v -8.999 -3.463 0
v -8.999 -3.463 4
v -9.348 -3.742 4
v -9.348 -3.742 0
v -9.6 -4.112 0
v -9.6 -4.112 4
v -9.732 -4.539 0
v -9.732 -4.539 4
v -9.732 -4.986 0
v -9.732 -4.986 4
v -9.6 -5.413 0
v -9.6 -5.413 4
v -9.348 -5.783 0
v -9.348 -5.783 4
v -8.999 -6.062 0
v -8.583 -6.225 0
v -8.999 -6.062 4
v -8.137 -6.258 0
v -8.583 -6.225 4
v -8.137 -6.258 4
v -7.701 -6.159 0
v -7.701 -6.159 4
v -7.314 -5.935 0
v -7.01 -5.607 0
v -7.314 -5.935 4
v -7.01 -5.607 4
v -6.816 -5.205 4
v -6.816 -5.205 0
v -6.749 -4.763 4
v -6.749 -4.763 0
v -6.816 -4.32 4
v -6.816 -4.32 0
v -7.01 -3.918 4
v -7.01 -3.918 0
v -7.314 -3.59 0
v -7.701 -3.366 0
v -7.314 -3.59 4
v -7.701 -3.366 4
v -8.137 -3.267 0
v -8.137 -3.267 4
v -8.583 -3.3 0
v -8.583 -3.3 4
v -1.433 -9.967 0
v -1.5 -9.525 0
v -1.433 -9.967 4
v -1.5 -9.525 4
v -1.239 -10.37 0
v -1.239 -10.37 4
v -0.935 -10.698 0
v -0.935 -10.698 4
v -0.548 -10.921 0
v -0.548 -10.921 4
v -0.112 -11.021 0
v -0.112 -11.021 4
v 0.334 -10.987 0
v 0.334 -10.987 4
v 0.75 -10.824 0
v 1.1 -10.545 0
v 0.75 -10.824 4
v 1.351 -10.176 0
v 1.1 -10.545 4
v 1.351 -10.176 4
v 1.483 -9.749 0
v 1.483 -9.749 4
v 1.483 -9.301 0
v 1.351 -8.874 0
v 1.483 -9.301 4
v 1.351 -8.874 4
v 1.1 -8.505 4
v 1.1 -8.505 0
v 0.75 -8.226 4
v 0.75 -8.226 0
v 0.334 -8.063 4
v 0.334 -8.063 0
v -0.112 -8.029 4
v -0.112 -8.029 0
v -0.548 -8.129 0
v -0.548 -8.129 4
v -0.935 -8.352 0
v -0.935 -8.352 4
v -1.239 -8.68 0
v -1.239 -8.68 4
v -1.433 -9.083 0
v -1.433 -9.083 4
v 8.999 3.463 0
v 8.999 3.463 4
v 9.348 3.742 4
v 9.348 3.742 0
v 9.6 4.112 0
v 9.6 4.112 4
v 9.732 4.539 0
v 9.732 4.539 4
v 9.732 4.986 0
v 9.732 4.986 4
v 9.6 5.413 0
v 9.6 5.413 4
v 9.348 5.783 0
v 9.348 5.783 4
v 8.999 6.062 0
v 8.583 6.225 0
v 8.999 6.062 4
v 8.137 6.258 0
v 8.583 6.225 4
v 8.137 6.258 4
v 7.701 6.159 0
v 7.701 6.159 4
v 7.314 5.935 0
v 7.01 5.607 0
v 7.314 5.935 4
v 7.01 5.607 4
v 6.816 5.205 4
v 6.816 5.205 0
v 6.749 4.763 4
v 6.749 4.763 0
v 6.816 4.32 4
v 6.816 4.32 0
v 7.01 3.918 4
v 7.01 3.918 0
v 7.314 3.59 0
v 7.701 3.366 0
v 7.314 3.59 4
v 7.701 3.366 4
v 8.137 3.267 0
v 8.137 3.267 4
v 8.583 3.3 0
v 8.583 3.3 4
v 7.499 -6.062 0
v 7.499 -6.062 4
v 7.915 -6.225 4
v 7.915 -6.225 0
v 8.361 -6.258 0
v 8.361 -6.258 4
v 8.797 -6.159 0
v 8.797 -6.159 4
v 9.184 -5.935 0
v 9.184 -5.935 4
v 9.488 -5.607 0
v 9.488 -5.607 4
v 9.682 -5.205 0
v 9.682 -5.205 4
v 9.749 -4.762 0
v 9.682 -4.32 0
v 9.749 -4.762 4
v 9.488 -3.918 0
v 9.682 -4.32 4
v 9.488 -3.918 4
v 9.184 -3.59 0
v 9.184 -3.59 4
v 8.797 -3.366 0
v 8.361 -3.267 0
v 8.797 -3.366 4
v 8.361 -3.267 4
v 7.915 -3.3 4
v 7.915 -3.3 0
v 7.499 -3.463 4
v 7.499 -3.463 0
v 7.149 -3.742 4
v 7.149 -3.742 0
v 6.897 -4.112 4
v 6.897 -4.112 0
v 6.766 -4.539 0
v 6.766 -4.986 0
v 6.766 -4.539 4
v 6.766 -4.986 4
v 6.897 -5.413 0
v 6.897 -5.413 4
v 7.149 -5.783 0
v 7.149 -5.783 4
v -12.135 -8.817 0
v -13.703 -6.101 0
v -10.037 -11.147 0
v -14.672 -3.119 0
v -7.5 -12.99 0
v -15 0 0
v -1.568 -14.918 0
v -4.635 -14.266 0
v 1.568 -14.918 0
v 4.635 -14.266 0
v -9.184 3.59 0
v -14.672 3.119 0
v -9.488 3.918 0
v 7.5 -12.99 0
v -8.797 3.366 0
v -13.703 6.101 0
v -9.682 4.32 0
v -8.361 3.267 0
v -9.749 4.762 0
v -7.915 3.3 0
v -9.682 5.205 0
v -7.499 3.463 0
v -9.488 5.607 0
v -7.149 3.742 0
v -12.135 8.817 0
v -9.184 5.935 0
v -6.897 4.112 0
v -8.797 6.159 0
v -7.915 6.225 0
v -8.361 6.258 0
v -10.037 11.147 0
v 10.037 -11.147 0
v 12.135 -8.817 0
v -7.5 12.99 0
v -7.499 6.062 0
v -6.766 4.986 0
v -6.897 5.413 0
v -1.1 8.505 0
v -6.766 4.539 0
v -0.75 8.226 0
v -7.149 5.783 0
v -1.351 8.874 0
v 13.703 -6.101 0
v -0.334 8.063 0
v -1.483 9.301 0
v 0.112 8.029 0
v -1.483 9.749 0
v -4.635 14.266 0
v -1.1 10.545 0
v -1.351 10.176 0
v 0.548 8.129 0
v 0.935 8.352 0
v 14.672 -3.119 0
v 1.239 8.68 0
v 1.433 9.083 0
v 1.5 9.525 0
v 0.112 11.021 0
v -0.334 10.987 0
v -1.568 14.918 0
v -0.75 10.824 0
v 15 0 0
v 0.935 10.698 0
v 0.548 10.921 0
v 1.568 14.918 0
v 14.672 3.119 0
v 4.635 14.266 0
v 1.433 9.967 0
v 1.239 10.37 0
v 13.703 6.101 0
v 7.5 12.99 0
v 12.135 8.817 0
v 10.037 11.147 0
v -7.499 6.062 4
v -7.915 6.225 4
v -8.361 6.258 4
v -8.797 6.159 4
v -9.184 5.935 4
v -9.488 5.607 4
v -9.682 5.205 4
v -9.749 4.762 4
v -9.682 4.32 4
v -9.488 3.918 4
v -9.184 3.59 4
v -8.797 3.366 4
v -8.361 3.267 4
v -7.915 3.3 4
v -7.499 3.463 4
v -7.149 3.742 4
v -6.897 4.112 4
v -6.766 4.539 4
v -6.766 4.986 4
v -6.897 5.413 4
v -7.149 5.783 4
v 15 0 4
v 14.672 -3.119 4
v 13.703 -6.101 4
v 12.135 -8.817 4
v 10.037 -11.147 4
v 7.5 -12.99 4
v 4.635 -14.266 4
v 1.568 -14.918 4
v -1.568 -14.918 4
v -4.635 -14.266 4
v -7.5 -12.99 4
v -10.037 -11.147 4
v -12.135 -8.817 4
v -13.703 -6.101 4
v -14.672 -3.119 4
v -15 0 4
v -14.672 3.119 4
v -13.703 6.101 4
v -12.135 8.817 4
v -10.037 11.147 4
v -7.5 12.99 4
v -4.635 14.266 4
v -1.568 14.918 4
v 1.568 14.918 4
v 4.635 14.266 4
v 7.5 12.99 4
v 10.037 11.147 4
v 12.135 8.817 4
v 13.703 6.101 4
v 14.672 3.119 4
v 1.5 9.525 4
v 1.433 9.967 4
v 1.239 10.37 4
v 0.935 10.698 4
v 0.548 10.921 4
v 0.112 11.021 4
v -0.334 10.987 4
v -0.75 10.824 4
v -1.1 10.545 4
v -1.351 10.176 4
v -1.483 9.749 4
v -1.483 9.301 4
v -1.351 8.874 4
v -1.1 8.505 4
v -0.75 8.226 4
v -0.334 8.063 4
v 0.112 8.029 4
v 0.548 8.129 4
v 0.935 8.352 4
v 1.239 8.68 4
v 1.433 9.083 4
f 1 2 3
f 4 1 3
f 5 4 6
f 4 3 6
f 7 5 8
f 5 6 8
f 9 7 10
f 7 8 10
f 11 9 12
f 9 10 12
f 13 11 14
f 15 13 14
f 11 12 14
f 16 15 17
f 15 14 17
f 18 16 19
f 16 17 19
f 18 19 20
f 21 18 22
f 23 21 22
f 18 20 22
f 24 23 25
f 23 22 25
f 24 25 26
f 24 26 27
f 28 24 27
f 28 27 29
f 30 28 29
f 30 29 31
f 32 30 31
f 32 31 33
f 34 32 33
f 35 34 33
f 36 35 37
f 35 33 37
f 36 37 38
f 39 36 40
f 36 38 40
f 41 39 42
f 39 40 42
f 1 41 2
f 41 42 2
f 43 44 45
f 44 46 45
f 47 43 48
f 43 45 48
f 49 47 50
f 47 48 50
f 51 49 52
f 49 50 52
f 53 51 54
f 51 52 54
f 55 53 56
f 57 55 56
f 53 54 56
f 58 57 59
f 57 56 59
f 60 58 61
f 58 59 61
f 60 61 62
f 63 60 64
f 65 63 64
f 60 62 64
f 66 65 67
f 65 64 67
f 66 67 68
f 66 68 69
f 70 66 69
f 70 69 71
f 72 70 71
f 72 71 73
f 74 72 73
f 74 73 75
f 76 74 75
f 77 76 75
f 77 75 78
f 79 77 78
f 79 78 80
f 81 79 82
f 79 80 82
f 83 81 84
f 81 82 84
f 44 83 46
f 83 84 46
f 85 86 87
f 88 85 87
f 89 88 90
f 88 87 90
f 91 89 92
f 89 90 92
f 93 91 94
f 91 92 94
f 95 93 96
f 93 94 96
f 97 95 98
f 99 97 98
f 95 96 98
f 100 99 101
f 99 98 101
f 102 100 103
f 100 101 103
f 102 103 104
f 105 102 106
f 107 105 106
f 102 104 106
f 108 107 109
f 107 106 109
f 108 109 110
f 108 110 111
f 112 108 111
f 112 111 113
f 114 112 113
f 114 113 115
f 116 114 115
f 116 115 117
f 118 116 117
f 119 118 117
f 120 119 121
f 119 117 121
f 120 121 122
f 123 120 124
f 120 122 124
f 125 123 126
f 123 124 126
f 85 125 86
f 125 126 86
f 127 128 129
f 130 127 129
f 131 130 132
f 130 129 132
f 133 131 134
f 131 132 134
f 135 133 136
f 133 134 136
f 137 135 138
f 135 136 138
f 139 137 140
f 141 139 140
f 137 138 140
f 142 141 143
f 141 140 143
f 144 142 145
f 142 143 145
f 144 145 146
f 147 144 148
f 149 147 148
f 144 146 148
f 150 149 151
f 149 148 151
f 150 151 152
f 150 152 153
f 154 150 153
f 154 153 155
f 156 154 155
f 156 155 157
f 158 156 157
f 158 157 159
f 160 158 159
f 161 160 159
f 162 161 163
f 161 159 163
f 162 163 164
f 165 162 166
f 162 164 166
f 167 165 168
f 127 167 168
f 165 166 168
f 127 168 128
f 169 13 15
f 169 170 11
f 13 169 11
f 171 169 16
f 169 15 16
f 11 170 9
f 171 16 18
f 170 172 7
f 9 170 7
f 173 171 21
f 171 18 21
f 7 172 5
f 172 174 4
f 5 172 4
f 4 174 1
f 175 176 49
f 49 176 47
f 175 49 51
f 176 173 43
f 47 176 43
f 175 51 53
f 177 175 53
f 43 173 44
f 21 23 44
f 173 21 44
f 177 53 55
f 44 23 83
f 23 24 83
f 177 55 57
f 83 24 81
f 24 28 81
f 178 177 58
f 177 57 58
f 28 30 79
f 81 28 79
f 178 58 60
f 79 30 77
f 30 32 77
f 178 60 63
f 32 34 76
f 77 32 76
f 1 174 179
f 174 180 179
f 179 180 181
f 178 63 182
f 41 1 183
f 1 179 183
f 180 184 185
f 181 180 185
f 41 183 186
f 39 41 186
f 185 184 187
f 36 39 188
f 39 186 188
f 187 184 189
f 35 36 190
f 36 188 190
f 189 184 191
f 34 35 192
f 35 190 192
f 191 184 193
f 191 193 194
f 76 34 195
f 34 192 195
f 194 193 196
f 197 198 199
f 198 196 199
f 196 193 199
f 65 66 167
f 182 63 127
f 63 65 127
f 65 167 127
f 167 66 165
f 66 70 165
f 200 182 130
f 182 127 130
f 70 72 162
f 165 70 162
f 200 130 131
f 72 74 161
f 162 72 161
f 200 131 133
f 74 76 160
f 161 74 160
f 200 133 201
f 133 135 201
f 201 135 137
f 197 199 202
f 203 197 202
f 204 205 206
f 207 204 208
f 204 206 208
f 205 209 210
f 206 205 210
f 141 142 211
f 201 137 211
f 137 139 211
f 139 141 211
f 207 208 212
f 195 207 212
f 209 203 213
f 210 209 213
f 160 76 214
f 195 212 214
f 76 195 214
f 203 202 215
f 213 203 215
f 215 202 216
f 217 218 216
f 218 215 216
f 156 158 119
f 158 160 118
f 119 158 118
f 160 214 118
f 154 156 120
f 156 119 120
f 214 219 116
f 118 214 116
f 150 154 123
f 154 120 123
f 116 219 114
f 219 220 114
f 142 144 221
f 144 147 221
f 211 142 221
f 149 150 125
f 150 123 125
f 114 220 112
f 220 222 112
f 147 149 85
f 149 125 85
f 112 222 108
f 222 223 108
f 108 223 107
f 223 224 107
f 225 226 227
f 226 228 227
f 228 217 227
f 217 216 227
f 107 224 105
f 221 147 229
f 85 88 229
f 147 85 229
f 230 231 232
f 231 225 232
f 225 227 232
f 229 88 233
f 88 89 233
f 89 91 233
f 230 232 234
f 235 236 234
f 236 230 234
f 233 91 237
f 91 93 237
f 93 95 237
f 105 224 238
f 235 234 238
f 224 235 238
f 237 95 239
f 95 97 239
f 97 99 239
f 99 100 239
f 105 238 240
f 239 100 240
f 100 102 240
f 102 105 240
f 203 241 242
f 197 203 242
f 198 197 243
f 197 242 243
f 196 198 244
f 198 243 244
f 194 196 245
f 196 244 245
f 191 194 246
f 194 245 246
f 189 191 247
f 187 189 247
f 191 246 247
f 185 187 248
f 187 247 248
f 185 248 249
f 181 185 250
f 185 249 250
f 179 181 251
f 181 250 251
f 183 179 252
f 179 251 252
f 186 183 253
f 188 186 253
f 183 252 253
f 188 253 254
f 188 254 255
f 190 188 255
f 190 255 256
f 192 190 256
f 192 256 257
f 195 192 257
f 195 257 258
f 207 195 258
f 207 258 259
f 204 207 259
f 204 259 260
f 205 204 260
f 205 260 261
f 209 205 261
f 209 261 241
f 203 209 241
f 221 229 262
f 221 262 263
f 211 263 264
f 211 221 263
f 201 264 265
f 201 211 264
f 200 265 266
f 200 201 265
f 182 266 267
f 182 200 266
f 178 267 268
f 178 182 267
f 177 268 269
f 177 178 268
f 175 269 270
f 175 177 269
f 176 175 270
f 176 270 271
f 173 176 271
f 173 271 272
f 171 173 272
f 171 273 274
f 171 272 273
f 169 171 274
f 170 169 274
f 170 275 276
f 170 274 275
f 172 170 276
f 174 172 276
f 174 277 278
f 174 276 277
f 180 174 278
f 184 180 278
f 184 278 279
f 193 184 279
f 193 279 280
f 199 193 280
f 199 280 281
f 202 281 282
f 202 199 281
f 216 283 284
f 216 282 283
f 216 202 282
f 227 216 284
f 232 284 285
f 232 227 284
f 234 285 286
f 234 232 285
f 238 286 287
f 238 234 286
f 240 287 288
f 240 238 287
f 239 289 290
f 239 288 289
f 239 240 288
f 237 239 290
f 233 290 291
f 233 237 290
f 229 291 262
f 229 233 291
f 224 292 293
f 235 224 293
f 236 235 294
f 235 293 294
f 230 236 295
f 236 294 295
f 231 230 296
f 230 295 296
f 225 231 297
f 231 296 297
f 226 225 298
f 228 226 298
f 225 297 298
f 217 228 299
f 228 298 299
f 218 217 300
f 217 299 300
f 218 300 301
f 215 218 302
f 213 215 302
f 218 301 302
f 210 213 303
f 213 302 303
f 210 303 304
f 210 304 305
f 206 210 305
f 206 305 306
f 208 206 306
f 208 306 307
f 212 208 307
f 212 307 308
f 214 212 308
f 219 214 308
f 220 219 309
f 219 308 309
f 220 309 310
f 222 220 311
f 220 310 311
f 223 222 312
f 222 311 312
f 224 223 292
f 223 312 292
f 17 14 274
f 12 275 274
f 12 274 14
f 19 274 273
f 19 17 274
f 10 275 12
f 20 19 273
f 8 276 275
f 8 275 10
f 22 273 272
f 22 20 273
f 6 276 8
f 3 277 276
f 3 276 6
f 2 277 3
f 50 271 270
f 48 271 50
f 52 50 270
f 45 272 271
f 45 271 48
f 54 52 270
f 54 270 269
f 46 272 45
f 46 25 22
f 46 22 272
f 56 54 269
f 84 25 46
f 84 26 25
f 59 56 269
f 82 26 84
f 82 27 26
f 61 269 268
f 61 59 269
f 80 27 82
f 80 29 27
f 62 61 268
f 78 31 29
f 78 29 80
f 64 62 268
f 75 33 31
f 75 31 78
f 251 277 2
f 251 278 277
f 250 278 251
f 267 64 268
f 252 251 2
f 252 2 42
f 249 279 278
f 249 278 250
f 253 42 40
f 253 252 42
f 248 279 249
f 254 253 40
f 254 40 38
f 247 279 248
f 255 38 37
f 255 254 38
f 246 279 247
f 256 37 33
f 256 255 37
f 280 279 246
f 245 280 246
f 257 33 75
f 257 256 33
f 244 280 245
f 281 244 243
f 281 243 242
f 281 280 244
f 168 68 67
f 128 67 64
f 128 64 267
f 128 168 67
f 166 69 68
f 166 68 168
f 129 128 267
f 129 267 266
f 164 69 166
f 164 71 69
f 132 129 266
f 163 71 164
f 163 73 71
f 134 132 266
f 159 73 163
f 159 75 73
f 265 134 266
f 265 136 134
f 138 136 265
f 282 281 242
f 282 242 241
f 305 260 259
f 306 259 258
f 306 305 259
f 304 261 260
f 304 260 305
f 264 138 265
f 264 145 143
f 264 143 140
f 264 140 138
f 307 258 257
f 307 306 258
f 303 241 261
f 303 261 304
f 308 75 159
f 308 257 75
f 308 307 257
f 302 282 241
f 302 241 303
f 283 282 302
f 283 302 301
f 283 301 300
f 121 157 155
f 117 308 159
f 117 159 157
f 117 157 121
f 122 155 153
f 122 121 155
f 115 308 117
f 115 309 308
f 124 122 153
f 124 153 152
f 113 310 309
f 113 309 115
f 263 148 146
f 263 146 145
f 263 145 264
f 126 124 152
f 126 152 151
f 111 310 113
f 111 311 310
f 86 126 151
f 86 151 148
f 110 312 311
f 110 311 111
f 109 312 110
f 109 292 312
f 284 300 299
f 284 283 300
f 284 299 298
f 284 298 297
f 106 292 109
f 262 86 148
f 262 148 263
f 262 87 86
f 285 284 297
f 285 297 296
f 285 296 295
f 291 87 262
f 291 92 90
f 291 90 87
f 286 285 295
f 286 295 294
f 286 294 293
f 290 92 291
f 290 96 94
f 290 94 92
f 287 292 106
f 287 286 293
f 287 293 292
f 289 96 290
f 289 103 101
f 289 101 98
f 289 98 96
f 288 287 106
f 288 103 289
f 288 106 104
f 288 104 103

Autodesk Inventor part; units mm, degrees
ref_plane "YZ Plane" through (0, 0, 0) normal (1, 0, 0) x (0, 1, 0)
ref_plane "XZ Plane" through (0, 0, 0) normal (0, 1, 0) x (-1, 0, 0)
ref_plane "XY Plane" through (0, 0, 0) normal (0, 0, 1) x (1, 0, 0)
sketch "Sketch1" plane through (0, 0, 0) normal (0, 0, 1) x (1, 0, 0)
  circle A0 centre (0, 0) radius 15
  dimension "d0" = 30
extrude "Extrusion1" add sketch "Sketch1" along normal blind 4
sketch "Sketch2" plane through (0, 0, 4) normal (0, 0, 1) x (1, 0, 0)
  circle A0 centre (0, 9.525) radius 1.5
  line L0 (0, -21) -> (0, 21) projected
  point P0 (0, 0)
  dimension "d3" = 3
  dimension "d4" = 9.525
extrude "Extrusion2" cut sketch "Sketch2" against normal blind 10
pattern_circular "Circular Pattern1" count 6 over 360 about axis through (0, 0, -10) along (0, 0, 1) of "Extrusion2"
properties part number "center_cover"
